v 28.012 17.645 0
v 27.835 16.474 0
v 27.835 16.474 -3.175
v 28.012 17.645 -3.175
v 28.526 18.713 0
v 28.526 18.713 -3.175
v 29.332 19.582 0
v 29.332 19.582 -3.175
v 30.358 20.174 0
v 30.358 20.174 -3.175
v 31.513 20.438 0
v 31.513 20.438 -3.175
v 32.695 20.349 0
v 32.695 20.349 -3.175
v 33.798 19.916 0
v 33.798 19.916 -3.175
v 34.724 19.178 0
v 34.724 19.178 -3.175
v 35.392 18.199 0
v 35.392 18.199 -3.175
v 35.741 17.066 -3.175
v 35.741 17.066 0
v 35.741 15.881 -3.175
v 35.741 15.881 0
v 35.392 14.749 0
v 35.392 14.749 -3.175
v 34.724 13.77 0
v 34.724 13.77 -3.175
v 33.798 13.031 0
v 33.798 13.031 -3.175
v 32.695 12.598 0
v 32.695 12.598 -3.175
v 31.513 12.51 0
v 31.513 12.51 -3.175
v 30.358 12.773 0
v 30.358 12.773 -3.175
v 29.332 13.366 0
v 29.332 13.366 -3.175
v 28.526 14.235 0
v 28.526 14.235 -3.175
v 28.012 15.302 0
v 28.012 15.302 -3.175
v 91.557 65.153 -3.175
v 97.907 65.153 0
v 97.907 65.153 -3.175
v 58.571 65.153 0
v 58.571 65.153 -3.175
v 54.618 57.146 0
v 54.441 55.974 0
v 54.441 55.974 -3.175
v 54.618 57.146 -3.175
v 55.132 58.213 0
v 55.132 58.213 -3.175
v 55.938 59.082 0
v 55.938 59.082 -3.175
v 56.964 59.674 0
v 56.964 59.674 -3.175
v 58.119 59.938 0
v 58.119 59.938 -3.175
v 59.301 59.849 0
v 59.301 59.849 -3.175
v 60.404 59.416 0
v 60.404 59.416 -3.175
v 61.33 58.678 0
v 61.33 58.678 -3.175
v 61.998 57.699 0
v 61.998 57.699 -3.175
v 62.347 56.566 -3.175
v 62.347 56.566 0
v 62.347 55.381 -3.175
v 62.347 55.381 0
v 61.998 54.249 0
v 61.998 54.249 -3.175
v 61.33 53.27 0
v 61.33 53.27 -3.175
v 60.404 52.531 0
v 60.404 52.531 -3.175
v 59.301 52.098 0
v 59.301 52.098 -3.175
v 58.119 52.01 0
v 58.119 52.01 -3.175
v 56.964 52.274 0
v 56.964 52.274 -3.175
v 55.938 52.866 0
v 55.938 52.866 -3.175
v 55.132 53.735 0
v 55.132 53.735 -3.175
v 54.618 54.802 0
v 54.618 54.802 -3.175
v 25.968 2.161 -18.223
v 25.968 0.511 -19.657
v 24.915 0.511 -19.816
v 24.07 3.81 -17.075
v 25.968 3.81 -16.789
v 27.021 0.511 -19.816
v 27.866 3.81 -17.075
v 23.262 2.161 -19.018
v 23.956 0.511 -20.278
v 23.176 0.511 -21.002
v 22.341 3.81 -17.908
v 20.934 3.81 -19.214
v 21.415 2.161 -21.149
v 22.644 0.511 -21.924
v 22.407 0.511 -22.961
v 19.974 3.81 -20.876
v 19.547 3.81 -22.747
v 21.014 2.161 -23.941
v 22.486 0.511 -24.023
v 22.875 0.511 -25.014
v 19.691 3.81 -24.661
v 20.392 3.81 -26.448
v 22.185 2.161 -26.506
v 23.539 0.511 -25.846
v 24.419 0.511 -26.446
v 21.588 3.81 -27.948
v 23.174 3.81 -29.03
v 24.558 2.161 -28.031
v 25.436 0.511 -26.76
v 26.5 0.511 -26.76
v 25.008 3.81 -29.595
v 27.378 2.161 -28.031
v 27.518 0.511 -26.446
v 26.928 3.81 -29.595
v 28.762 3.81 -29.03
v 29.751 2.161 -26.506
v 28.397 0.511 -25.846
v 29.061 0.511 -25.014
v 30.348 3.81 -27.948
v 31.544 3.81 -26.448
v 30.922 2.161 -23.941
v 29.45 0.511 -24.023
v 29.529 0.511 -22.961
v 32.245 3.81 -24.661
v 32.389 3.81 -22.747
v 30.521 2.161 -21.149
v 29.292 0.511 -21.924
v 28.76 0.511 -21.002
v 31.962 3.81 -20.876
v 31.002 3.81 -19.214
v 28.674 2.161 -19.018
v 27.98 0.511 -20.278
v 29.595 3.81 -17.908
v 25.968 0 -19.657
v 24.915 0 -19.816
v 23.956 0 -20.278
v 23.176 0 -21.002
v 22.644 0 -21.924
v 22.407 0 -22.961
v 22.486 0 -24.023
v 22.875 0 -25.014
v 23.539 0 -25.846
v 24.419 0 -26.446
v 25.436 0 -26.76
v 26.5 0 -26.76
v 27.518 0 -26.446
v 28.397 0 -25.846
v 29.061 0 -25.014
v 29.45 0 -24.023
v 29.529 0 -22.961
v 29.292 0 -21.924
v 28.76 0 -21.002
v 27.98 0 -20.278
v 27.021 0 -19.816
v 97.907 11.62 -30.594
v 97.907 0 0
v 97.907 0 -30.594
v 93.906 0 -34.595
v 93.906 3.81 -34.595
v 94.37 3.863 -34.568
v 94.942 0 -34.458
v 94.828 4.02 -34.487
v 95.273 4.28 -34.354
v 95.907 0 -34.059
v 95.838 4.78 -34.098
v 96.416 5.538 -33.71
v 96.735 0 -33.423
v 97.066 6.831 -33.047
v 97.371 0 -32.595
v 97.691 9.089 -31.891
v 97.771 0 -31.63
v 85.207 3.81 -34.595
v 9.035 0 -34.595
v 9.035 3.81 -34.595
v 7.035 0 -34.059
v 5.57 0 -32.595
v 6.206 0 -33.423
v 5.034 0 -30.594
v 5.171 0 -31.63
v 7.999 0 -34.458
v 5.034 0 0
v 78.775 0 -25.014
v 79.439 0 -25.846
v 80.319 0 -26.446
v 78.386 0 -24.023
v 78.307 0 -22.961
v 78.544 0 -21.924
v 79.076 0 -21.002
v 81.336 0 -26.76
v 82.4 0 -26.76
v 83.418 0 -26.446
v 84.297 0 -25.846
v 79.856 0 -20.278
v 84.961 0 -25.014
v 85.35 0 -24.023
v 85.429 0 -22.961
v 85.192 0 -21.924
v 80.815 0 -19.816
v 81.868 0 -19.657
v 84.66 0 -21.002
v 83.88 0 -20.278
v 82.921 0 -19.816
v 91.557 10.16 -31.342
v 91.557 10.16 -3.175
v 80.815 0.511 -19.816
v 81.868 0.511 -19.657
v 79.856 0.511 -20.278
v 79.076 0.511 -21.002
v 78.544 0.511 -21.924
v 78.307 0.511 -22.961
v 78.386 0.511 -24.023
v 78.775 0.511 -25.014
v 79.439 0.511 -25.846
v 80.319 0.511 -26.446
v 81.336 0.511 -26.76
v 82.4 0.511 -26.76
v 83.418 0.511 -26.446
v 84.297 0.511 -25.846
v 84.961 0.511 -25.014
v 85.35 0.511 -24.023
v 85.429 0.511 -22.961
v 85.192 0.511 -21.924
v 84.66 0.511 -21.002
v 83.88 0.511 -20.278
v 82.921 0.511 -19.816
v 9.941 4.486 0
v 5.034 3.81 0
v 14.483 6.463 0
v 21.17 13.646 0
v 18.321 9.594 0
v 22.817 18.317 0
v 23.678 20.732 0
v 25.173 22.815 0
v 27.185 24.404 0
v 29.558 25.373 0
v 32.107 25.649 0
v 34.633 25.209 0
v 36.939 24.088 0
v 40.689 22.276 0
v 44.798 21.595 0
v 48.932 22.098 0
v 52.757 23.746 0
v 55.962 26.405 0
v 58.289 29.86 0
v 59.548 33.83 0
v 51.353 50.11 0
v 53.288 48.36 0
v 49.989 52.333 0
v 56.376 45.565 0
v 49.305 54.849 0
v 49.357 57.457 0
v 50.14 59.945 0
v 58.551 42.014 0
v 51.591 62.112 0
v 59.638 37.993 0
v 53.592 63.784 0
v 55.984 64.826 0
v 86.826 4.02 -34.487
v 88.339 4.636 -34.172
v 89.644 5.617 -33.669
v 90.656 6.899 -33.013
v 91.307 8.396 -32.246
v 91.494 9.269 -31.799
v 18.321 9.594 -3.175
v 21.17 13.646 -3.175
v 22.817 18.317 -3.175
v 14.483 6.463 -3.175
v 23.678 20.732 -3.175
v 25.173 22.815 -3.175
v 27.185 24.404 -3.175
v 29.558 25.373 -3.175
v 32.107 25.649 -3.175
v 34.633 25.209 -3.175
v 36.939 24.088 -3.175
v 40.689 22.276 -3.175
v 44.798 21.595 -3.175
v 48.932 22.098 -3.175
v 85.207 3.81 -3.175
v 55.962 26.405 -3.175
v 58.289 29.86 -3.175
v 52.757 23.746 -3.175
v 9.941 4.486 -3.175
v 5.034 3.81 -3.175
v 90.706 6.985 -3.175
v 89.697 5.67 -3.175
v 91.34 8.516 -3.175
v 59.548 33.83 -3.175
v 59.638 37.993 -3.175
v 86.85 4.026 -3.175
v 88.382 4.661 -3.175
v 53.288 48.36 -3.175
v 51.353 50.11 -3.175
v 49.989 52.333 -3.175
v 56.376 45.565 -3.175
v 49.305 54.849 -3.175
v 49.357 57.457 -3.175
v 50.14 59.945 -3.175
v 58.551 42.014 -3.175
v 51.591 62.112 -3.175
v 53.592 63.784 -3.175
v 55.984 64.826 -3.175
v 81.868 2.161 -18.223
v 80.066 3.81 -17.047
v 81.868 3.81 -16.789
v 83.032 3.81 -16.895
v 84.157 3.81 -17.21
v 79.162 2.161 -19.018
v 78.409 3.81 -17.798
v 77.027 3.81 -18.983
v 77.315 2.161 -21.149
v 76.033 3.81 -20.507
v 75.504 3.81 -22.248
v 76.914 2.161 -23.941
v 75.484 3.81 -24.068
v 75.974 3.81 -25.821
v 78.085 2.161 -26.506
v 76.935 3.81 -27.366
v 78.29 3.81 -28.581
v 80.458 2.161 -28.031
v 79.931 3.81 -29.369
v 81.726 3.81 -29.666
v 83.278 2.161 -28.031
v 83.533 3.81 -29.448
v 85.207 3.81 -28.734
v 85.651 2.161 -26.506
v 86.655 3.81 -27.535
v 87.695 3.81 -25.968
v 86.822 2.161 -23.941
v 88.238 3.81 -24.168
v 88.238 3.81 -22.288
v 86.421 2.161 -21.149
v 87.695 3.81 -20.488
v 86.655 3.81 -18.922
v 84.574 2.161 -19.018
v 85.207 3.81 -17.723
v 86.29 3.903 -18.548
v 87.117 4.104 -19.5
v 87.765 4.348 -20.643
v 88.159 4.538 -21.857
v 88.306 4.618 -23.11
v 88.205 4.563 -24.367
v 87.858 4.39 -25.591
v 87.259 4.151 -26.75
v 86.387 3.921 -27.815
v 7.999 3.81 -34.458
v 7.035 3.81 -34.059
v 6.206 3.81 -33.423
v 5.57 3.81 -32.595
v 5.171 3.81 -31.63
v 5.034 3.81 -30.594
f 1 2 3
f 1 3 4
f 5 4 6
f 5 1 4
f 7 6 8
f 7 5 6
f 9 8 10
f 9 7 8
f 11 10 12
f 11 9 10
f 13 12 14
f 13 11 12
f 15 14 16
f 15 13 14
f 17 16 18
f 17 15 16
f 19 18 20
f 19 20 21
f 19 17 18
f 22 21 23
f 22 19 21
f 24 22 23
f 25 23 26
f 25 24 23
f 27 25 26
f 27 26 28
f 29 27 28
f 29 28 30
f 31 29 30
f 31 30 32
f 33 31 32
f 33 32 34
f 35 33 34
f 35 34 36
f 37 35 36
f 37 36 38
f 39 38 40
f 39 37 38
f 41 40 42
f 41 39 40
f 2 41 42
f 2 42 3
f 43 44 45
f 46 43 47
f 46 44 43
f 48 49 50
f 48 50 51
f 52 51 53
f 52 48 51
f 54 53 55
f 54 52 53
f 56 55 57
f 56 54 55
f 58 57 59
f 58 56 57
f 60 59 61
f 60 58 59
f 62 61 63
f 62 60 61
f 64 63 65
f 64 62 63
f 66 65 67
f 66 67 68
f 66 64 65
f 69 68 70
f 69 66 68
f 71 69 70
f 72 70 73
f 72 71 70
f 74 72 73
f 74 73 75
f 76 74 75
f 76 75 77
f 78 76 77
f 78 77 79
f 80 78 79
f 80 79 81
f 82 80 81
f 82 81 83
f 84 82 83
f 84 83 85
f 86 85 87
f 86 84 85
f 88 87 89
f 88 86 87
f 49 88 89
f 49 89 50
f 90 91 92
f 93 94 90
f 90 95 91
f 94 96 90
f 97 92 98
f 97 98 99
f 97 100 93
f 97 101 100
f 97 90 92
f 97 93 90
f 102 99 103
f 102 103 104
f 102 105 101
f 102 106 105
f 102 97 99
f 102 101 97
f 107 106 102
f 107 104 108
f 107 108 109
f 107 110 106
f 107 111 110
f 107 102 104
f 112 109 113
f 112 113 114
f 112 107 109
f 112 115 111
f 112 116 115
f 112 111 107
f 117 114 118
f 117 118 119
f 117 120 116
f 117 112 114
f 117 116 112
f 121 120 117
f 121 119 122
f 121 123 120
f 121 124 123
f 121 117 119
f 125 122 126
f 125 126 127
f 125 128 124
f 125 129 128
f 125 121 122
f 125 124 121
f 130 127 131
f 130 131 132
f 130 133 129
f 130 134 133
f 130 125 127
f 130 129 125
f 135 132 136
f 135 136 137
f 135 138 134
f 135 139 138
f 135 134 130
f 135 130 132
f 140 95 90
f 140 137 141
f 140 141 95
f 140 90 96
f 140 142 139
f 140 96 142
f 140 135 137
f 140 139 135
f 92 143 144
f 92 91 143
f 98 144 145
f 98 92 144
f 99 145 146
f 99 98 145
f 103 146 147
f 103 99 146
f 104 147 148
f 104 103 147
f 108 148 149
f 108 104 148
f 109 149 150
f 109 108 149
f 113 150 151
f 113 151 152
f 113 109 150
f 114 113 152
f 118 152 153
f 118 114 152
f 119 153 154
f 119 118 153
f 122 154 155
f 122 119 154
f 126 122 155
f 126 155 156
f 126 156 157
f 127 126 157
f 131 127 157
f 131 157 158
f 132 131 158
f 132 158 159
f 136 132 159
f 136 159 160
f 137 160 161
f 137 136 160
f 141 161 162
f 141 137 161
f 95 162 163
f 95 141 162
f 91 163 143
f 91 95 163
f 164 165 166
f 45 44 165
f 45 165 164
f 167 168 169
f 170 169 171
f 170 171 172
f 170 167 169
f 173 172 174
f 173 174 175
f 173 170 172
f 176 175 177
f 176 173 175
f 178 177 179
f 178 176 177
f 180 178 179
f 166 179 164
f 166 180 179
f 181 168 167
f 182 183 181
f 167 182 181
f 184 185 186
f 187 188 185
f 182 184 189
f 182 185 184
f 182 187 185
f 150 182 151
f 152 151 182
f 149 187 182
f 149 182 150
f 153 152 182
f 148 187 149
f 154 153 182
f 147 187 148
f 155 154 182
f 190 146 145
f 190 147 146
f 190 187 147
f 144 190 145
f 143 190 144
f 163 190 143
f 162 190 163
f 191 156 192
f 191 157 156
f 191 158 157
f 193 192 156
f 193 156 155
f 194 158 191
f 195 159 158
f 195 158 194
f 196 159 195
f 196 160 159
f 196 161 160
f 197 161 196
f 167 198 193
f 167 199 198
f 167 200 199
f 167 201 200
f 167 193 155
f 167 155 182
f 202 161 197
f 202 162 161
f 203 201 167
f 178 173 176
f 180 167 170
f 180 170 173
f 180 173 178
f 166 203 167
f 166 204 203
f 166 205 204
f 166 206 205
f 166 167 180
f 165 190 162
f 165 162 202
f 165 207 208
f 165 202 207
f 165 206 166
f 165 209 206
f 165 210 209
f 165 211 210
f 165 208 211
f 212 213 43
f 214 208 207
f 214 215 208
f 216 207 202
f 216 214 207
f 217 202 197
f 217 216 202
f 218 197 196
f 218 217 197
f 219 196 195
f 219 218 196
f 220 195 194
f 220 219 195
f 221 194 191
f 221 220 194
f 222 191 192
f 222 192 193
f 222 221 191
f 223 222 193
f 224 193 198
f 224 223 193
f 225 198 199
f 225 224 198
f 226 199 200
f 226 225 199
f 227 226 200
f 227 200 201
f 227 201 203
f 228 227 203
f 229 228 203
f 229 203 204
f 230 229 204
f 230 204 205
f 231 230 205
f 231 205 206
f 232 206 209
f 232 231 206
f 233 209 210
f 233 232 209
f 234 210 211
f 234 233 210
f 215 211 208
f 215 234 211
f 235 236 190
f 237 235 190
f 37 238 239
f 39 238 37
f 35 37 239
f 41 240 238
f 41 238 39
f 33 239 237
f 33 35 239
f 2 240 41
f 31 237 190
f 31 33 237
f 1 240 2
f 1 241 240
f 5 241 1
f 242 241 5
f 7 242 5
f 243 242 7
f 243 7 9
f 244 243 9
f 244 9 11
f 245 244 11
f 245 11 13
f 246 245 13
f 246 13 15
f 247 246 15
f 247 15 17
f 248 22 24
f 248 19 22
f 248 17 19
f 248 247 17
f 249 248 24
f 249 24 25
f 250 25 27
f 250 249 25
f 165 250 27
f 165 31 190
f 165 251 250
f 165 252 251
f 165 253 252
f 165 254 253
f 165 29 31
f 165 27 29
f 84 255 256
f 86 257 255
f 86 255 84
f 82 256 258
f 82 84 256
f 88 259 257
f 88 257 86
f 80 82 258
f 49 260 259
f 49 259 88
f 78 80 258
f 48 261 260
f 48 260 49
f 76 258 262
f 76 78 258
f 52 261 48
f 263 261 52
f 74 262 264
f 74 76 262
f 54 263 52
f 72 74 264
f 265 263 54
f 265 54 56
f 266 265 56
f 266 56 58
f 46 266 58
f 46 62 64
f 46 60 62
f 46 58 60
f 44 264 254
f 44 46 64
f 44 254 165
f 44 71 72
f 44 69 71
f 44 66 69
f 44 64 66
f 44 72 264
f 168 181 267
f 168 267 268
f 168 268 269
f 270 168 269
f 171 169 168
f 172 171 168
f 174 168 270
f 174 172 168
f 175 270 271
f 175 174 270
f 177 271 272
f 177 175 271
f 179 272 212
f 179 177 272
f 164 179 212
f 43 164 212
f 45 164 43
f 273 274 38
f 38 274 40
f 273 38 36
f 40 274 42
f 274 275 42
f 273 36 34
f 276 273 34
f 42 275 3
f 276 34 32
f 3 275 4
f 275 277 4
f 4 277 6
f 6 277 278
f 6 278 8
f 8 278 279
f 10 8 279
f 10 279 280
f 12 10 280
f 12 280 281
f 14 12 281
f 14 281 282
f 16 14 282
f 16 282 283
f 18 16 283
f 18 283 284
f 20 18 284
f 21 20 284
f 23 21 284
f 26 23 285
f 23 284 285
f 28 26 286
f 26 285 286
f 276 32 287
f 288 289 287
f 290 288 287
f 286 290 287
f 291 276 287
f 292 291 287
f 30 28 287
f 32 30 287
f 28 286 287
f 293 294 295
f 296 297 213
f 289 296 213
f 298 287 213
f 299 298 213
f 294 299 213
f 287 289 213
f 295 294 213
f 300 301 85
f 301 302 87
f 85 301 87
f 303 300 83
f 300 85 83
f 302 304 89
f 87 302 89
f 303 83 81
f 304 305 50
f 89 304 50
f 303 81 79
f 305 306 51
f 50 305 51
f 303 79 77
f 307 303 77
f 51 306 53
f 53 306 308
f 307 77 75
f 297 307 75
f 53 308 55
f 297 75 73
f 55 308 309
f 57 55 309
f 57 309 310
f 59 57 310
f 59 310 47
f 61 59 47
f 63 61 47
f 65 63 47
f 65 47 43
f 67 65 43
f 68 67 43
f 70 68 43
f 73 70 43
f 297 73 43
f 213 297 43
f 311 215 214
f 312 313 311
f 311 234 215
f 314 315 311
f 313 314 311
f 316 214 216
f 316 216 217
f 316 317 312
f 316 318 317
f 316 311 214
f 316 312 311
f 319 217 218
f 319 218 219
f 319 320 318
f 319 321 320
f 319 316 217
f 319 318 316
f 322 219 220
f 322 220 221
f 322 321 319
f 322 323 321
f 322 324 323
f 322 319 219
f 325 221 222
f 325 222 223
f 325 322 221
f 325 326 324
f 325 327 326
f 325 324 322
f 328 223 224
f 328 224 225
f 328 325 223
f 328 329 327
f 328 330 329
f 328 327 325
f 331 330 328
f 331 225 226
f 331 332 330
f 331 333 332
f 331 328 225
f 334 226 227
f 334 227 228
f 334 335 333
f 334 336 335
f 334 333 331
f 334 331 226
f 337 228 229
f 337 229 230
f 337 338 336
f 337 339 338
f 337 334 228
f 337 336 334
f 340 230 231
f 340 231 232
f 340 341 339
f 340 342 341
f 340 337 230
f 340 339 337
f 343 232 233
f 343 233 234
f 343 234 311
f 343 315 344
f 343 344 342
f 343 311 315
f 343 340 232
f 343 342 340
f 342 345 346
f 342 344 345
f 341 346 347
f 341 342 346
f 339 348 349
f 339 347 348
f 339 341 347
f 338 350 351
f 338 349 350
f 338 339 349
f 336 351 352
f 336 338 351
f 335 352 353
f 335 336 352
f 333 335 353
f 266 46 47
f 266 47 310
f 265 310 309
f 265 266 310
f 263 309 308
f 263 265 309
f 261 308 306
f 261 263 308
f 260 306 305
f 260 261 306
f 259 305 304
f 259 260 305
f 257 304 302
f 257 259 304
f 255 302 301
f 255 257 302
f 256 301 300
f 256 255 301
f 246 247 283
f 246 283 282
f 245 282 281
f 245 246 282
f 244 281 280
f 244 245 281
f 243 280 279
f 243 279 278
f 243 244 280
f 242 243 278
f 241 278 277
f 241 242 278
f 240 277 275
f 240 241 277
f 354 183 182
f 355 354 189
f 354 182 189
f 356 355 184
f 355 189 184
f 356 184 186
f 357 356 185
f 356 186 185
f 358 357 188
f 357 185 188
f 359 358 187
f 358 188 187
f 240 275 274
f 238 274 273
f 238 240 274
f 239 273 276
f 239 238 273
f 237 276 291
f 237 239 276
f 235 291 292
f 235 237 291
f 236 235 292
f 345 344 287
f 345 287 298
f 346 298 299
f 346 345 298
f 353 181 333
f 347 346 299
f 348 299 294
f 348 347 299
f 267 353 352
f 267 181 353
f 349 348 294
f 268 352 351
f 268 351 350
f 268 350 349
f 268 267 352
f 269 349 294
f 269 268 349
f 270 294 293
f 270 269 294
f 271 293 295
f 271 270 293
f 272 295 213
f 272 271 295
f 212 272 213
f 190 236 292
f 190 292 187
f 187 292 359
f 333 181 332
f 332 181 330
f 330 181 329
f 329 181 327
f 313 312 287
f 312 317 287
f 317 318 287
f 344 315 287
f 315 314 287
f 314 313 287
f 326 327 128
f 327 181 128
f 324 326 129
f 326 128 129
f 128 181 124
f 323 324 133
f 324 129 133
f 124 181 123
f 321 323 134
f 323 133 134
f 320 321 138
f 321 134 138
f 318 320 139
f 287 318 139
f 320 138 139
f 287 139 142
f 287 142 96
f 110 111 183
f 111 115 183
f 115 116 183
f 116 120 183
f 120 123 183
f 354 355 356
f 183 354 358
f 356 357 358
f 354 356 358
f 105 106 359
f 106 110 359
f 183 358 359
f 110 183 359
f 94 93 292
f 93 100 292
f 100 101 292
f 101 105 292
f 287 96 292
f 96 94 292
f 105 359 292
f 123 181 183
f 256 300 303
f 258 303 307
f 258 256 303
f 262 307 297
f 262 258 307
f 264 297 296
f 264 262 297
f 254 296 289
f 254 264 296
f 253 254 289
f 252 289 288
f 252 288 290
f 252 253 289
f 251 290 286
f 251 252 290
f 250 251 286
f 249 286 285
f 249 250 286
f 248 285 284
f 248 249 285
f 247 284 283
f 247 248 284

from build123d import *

# Parameters (mm, degrees)
SKETCH2_W                                   = 101.6
SKETCH2_H                                   = 127
BOSS_EXTRUDE1_DEPTH                         = 3.175
SKETCH5_R                                   = 3.9751
CUT_EXTRUDE1_DEPTH                          = 3.175
BOSS_EXTRUDE3_DEPTH                         = 92.87256
BOSS_EXTRUDE4_DEPTH                         = 6.35
SKETCH18_R                                  = 3.175
CUT_EXTRUDE3_DEPTH                          = 6.8072
FILLET4_R                                   = 4.0005
CUT_EXTRUDE4_DEPTH                          = 34.5948
CUT_EXTRUDE5_DEPTH                          = 2.9972
FILLET7_R                                   = 6.35
CSK_FOR_1_4_FLAT_HEAD_MACHINE_SCREW_2_COUNT = 2
CSK_FOR_1_4_FLAT_HEAD_MACHINE_SCREW_2_PITCH = 55.9
SKETCH36_R                                  = 6.4389
CUT_EXTRUDE6_DEPTH                          = 2.54


with BuildPart() as part:
    # Sketch2 → Boss-Extrude1 (new body)
    with BuildSketch(Plane.XY):
        with Locations((50.8, 63.5)):
            Rectangle(SKETCH2_W, SKETCH2_H)
    extrude(amount=BOSS_EXTRUDE1_DEPTH)

    # Sketch5 → Cut-Extrude1 (cut)
    with BuildSketch(Plane(origin=(0, 0, 0), x_dir=(-1, 0, 0), z_dir=(0, 0, -1))):
        with BuildLine():
            Line((-81.586228812, 65.152573183), (-58.571239337, 65.152573183))
            ThreePointArc((-58.571239337, 65.152573183), (-49.65943867, 58.729036089), (-53.287760408, 48.359981104))
            ThreePointArc((-53.287760408, 48.359981104), (-57.249364207, 28.049269577), (-36.93865268, 24.087665778))
            ThreePointArc((-36.93865268, 24.087665778), (-28.337713232, 24.971703827), (-22.817162059, 18.317291951))
            ThreePointArc((-22.817162059, 18.317291951), (-16.509170131, 7.896881921), (-5.03428, 3.81))
            Line((-5.03428, 3.81), (-5.03428, 0))
            Line((-5.03428, 0), (0, 0))
            Line((0, 0), (0, 127))
            Line((0, 127), (-101.6, 127))
            Line((-101.6, 127), (-101.6, 0))
            Line((-101.6, 0), (-97.90684, 0))
            Line((-97.90684, 0), (-97.90684, 65.152573183))
            Line((-97.90684, 65.152573183), (-81.586228812, 65.152573183))
        make_face()
        with Locations((-58.416247506, 55.973867932)):
            Circle(SKETCH5_R)
        with Locations((-31.810165582, 16.473778949)):
            Circle(SKETCH5_R)
    extrude(amount=-CUT_EXTRUDE1_DEPTH, mode=Mode.SUBTRACT)

    # Sketch10 → Boss-Extrude3 (add)
    with BuildSketch(Plane(origin=(5.03428, 0, 0), x_dir=(0, 0, -1), z_dir=(1, 0, 0))):
        Polygon((-3.175, 0), (-4.2418, 0), (-4.2418, -2.9972), (-34.5948, -2.9972), (-34.5948, 0), (-34.5948, 3.81), (-3.175, 3.81), align=None)
    extrude(amount=BOSS_EXTRUDE3_DEPTH)

    # Sketch11 → Boss-Extrude4 (add)
    with BuildSketch(Plane(origin=(97.90684, 0, 0), x_dir=(0, 0, -1), z_dir=(1, 0, 0))):
        Polygon((-3.175, 65.152573183), (-3.175, 3.81), (-34.5948, 3.81), align=None)
    extrude(amount=-BOSS_EXTRUDE4_DEPTH)

    # Sketch18 → Cut-Extrude3 (cut)
    with BuildSketch(Plane.XZ.offset(2.9972)):
        with Locations(Location((25.968032816, 23.228300068, 0), (0, 0, 270))):
            Circle(SKETCH18_R)
        with Locations(Location((81.868032816, 23.228300068, 0), (0, 0, 270))):
            Circle(SKETCH18_R)
    extrude(amount=-CUT_EXTRUDE3_DEPTH, mode=Mode.SUBTRACT)

    # Fillet4
    fillet4_edges = [part.edges().sort_by_distance(p)[0] for p in [
        (97.90684, -1.4986, 4.2418),
        (5.03428, -1.4986, 4.2418),
        (97.90684, 0.4064, 34.5948),
        (5.03428, 0.4064, 34.5948),
    ]]
    fillet(fillet4_edges, radius=FILLET4_R)

    # Mirror5: part across plane


with BuildPart() as part_1:
    add(part.part)
    add(part.part.mirror(Plane.XY))

    # Sketch25 → Cut-Extrude4 (cut)
    with BuildSketch(Plane.XY):
        Polygon((105.475480197, -15.241589329), (106.840773124, 71.833759528), (-8.541984089, 73.642896836), (-9.907277015, -13.432452021), align=None)
    extrude(amount=CUT_EXTRUDE4_DEPTH, mode=Mode.SUBTRACT)

    # Sketch28 → Cut-Extrude5 (cut)
    with BuildSketch(Plane.XZ.offset(2.9972)):
        with BuildLine():
            Line((93.90634, -4.2418), (9.03478, -4.2418))
            ThreePointArc((9.03478, -4.2418), (6.205999322, -5.413519322), (5.03428, -8.2423))
            Line((5.03428, -8.2423), (5.03428, -30.5943))
            ThreePointArc((5.03428, -30.5943), (6.205999322, -33.423080678), (9.03478, -34.5948))
            Line((9.03478, -34.5948), (93.90634, -34.5948))
            ThreePointArc((93.90634, -34.5948), (96.735120678, -33.423080678), (97.90684, -30.5943))
            Line((97.90684, -30.5943), (97.90684, -8.2423))
            ThreePointArc((97.90684, -8.2423), (96.735120678, -5.413519322), (93.90634, -4.2418))
        make_face()
    extrude(amount=-CUT_EXTRUDE5_DEPTH, mode=Mode.SUBTRACT)

    # Fillet7
    fillet7_edges = [part_1.edges().sort_by_distance(p)[0] for p in [
        (91.55684, 3.81, -18.8849),
    ]]
    fillet(fillet7_edges, radius=FILLET7_R)

    # Sketch35 → CSK for 1/4 Flat Head Machine Screw (100)1 (revolve, cut)
    with BuildSketch(Plane(origin=(25.968032816, 3.81, -23.228300068), x_dir=(0, 0, 1), z_dir=(1, 0, 0))):
        Polygon((0, 0), (0, 3.81), (3.57124, 3.81), (3.57124, 3.298865467), (6.4389, 0), align=None)
    csk_for_1_4_flat_head_machine_screw_100 = revolve(axis=Axis((25.968032816, 10.16, -23.228300068), (0, -1, 0)), mode=Mode.SUBTRACT)

    # CSK for 1_4 Flat Head Machine Screw  2: CSK for 1/4 Flat Head Machine Screw (100)1 ×2
    with Locations(*[(i * CSK_FOR_1_4_FLAT_HEAD_MACHINE_SCREW_2_PITCH, 0, 0) for i in range(1, CSK_FOR_1_4_FLAT_HEAD_MACHINE_SCREW_2_COUNT)]):
        add(csk_for_1_4_flat_head_machine_screw_100, mode=Mode.SUBTRACT)

    # Sketch36 → Cut-Extrude6 (cut)
    with BuildSketch(Plane(origin=(0, 3.81, 0), x_dir=(1, 0, 0), z_dir=(0, 1, 0))):
        with Locations((81.868032816, 23.228300068)):
            Circle(SKETCH36_R)
    extrude(amount=CUT_EXTRUDE6_DEPTH, mode=Mode.SUBTRACT)


solid = part_1.part
